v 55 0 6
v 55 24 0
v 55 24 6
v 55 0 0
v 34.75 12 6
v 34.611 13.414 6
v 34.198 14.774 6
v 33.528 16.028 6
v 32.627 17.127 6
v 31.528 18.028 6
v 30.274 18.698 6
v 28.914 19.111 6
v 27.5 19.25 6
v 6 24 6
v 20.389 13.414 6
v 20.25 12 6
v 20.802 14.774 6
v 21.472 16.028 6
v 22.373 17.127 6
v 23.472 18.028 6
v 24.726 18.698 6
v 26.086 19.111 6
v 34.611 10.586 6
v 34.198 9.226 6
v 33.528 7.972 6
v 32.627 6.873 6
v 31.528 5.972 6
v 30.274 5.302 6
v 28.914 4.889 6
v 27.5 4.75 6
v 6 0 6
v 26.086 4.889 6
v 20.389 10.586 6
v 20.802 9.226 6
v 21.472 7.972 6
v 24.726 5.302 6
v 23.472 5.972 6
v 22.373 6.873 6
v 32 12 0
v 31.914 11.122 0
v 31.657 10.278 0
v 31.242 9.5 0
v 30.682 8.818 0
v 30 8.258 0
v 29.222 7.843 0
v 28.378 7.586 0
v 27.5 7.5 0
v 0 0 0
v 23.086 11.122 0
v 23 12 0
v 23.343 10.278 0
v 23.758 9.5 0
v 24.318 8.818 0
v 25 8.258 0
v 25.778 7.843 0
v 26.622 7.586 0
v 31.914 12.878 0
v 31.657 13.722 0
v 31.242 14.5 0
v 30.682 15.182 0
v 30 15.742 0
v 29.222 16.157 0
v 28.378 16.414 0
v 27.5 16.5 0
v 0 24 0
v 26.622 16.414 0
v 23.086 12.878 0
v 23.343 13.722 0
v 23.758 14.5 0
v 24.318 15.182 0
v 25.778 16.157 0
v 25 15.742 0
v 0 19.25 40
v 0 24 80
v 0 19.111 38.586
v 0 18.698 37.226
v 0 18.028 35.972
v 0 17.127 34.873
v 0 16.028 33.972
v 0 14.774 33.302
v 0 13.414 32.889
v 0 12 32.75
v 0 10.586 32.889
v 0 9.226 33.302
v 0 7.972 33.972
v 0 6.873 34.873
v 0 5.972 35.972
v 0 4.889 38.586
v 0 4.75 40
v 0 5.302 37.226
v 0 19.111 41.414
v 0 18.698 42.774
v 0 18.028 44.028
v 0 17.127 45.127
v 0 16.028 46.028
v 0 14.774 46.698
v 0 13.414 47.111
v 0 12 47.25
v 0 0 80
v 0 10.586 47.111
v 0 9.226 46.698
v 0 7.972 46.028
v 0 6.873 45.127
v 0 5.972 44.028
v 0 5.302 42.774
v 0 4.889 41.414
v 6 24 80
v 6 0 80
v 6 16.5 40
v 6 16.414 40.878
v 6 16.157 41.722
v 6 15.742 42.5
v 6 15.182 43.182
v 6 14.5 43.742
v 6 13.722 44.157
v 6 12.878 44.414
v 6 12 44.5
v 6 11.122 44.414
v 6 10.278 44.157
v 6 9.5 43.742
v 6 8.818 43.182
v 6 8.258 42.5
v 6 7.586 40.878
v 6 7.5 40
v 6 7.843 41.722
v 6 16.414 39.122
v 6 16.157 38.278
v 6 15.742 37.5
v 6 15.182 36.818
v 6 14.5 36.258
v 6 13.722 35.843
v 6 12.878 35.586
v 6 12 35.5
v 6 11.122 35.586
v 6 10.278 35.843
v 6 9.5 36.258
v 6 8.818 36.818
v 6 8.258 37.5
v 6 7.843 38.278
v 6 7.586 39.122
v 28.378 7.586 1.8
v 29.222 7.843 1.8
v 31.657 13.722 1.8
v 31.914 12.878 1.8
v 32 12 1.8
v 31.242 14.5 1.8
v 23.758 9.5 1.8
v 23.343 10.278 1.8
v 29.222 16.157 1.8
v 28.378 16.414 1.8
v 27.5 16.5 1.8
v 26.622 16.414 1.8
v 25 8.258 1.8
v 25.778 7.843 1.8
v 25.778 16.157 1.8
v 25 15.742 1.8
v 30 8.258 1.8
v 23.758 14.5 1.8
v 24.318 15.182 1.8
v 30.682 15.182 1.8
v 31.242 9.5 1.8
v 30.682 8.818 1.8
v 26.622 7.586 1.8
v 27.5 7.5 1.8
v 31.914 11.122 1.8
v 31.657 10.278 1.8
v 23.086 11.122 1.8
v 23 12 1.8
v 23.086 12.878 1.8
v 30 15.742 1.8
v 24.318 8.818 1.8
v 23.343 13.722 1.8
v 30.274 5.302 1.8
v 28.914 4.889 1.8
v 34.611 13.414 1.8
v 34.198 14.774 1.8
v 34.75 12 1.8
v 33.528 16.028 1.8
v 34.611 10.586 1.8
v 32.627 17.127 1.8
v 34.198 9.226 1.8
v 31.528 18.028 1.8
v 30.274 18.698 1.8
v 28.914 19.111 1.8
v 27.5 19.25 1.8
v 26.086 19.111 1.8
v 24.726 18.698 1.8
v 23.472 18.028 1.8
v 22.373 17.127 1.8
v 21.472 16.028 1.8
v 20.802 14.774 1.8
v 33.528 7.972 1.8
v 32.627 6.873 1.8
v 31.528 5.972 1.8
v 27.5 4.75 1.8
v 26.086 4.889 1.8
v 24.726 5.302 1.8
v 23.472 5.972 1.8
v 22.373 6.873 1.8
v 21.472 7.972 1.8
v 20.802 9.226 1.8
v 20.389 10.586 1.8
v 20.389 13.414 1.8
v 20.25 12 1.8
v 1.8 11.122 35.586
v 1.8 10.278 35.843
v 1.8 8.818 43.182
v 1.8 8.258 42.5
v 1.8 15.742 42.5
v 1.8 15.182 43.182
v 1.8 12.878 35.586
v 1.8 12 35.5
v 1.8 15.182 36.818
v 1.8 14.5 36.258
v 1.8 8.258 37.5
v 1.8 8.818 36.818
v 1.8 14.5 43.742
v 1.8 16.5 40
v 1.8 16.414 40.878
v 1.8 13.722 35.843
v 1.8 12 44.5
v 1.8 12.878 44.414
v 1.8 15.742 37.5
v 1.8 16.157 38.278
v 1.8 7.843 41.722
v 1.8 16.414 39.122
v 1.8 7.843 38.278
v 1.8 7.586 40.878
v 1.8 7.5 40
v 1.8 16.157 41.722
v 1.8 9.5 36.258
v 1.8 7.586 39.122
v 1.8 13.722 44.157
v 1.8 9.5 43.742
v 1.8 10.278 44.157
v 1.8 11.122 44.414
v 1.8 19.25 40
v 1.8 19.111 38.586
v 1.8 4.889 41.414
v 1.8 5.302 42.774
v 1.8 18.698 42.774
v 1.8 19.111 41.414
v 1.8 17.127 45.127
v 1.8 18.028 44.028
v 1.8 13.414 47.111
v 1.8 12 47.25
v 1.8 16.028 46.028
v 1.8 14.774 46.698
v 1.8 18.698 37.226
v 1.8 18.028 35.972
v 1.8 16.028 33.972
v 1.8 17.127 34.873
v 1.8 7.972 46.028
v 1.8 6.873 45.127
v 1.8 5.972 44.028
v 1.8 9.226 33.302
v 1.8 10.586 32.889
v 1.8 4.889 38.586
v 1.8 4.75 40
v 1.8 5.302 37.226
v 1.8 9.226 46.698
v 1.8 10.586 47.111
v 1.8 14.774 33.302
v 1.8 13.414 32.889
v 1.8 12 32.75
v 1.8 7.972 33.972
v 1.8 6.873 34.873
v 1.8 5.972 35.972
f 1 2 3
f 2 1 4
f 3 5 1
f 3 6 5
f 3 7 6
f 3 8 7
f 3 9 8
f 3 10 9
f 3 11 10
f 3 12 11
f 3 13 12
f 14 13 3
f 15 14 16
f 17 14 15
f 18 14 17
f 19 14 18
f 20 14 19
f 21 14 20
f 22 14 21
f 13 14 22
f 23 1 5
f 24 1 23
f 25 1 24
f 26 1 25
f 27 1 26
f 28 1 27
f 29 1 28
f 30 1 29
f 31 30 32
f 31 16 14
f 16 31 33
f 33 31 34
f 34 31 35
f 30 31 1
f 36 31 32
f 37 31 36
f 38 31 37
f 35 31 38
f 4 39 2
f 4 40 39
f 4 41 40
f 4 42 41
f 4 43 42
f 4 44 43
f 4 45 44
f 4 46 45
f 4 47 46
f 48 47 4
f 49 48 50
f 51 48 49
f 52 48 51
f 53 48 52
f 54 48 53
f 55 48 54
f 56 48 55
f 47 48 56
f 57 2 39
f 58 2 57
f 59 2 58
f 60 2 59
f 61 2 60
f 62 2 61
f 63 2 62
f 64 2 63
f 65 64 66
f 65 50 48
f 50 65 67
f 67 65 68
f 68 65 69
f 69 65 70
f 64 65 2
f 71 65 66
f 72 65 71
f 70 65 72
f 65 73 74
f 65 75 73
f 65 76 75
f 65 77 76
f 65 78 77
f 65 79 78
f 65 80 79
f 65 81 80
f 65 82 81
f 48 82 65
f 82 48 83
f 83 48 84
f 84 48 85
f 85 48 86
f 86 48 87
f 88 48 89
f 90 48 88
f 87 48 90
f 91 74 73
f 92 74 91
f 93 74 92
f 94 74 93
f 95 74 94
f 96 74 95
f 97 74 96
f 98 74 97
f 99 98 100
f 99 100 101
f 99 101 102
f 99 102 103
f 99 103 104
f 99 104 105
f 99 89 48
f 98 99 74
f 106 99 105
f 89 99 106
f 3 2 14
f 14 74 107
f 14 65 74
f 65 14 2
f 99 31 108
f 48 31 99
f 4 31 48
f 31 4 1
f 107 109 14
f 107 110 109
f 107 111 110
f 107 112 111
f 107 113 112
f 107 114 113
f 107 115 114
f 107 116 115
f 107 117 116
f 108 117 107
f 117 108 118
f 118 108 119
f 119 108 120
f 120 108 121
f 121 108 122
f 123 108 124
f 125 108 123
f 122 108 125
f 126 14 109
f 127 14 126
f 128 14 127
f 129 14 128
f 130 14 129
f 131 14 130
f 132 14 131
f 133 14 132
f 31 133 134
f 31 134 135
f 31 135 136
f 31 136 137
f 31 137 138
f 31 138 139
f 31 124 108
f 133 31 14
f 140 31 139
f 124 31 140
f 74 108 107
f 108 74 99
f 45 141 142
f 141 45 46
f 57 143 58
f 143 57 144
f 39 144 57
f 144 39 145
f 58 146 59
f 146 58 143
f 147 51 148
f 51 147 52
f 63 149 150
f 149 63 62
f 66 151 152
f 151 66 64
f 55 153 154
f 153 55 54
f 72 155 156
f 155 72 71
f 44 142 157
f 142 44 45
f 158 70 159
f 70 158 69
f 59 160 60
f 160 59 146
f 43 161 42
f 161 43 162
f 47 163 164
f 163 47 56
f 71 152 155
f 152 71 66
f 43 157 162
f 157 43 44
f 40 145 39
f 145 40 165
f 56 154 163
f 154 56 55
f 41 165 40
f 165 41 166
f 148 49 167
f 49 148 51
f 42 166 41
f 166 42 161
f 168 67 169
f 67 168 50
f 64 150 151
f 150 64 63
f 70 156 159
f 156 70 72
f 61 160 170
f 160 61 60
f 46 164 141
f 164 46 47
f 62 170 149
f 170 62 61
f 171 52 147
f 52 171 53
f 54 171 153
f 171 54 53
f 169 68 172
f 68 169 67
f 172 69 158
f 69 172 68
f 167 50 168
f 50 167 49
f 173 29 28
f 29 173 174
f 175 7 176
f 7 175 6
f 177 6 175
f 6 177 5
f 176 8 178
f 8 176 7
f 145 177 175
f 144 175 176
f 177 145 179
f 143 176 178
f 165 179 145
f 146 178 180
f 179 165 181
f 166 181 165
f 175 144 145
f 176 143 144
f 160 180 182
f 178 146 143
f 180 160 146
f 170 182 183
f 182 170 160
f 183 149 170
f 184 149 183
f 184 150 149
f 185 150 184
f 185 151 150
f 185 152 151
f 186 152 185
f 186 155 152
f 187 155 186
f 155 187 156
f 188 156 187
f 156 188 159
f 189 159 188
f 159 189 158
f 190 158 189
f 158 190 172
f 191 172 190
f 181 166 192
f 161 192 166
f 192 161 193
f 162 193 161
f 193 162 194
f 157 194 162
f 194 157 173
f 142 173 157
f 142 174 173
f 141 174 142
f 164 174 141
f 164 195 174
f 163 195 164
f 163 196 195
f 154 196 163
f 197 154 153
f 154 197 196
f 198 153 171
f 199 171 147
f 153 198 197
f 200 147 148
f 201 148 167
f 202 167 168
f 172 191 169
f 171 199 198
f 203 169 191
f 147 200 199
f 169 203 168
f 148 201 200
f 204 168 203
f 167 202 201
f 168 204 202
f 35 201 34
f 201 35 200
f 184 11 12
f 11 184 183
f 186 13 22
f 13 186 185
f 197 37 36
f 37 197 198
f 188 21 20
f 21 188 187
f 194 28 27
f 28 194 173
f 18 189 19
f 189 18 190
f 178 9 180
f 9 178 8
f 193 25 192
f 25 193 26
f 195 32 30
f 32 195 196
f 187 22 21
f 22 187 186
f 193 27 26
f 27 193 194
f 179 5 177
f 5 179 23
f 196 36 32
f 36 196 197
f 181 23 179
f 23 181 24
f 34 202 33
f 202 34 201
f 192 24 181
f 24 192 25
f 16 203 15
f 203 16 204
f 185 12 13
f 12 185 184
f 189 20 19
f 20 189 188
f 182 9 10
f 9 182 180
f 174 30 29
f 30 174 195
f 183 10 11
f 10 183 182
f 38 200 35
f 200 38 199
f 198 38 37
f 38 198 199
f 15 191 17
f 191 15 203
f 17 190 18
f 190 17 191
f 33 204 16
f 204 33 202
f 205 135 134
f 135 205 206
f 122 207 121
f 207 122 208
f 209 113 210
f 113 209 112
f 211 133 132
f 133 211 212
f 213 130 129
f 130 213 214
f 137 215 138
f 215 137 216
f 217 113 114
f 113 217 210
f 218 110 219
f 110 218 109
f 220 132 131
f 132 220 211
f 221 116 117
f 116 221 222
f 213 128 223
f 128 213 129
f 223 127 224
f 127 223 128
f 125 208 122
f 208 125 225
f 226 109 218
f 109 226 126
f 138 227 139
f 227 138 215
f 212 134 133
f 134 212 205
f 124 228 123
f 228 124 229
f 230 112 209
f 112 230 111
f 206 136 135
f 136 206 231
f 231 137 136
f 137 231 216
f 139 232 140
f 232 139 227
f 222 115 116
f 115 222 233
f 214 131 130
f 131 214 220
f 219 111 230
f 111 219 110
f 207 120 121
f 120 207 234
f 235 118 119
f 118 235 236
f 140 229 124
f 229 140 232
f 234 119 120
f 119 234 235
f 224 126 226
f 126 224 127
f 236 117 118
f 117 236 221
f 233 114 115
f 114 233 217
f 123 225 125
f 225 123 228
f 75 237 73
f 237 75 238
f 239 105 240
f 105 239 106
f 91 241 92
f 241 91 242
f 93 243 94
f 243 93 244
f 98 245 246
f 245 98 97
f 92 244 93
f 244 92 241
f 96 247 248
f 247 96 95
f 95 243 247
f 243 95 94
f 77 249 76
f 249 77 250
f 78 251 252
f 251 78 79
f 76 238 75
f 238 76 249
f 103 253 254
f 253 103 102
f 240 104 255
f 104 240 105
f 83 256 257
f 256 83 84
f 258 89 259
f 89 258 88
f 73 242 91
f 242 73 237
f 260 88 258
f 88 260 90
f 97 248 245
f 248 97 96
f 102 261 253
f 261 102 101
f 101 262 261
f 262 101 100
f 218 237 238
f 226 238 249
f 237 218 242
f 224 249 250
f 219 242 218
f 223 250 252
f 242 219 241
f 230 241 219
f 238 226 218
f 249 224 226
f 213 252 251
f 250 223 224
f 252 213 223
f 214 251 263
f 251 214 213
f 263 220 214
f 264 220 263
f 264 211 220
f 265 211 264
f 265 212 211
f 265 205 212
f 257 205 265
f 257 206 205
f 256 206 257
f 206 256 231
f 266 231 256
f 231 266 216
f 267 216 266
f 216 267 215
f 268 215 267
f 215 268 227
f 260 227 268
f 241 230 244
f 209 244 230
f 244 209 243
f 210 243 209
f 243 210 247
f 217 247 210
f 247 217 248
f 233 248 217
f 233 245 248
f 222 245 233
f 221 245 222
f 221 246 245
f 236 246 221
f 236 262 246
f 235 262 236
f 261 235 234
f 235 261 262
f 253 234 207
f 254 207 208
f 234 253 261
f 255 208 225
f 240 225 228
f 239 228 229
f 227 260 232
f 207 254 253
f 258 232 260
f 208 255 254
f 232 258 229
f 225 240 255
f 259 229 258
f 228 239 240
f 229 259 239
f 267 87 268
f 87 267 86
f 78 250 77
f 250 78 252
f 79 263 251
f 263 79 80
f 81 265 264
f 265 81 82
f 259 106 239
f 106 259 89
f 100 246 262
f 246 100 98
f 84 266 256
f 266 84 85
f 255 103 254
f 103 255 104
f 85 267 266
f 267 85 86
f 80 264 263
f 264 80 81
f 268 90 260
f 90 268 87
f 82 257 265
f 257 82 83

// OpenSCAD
$fn = 32;

// ----------------------------------------------------------------------
// L-bracket: 55 x 24 x 80 mm
// ----------------------------------------------------------------------

// --- parameters (mm) ---
base_len = 55;            // horizontal leg, X
upright_h = 80;           // vertical leg, Z
flange_w = 24;            // bracket depth, Y
mat_t = 6;                // plate thickness
hole_d = 9;               // clearance for M8
cb_d = 14.5;              // counterbore seat
cb_h = 4.2;               // counterbore depth

module hole_z(px, py) {
  translate([px, py, -0.5]) cylinder(h = mat_t + 1, d = hole_d);
}
module hole_x(pz, py) {
  translate([-0.5, py, pz]) rotate([0, 90, 0]) cylinder(h = mat_t + 1, d = hole_d);
}
module cb_z(px, py) {
  translate([px, py, mat_t - cb_h]) cylinder(h = cb_h + 0.4, d = cb_d);
}
module cb_x(pz, py) {
  translate([mat_t - cb_h, py, pz]) rotate([0, -90, 0]) cylinder(h = cb_h + 0.4, d = cb_d);
}

difference() {
  union() {
    /* horizontal leg */
    cube([base_len, flange_w, mat_t]);
    /* vertical leg, overlapping the corner block */
    cube([mat_t, flange_w, upright_h]);
  }
  hole_z(27.5, 12);
  cb_z(27.5, 12);
  hole_x(40, 12);
  cb_x(40, 12);
}
